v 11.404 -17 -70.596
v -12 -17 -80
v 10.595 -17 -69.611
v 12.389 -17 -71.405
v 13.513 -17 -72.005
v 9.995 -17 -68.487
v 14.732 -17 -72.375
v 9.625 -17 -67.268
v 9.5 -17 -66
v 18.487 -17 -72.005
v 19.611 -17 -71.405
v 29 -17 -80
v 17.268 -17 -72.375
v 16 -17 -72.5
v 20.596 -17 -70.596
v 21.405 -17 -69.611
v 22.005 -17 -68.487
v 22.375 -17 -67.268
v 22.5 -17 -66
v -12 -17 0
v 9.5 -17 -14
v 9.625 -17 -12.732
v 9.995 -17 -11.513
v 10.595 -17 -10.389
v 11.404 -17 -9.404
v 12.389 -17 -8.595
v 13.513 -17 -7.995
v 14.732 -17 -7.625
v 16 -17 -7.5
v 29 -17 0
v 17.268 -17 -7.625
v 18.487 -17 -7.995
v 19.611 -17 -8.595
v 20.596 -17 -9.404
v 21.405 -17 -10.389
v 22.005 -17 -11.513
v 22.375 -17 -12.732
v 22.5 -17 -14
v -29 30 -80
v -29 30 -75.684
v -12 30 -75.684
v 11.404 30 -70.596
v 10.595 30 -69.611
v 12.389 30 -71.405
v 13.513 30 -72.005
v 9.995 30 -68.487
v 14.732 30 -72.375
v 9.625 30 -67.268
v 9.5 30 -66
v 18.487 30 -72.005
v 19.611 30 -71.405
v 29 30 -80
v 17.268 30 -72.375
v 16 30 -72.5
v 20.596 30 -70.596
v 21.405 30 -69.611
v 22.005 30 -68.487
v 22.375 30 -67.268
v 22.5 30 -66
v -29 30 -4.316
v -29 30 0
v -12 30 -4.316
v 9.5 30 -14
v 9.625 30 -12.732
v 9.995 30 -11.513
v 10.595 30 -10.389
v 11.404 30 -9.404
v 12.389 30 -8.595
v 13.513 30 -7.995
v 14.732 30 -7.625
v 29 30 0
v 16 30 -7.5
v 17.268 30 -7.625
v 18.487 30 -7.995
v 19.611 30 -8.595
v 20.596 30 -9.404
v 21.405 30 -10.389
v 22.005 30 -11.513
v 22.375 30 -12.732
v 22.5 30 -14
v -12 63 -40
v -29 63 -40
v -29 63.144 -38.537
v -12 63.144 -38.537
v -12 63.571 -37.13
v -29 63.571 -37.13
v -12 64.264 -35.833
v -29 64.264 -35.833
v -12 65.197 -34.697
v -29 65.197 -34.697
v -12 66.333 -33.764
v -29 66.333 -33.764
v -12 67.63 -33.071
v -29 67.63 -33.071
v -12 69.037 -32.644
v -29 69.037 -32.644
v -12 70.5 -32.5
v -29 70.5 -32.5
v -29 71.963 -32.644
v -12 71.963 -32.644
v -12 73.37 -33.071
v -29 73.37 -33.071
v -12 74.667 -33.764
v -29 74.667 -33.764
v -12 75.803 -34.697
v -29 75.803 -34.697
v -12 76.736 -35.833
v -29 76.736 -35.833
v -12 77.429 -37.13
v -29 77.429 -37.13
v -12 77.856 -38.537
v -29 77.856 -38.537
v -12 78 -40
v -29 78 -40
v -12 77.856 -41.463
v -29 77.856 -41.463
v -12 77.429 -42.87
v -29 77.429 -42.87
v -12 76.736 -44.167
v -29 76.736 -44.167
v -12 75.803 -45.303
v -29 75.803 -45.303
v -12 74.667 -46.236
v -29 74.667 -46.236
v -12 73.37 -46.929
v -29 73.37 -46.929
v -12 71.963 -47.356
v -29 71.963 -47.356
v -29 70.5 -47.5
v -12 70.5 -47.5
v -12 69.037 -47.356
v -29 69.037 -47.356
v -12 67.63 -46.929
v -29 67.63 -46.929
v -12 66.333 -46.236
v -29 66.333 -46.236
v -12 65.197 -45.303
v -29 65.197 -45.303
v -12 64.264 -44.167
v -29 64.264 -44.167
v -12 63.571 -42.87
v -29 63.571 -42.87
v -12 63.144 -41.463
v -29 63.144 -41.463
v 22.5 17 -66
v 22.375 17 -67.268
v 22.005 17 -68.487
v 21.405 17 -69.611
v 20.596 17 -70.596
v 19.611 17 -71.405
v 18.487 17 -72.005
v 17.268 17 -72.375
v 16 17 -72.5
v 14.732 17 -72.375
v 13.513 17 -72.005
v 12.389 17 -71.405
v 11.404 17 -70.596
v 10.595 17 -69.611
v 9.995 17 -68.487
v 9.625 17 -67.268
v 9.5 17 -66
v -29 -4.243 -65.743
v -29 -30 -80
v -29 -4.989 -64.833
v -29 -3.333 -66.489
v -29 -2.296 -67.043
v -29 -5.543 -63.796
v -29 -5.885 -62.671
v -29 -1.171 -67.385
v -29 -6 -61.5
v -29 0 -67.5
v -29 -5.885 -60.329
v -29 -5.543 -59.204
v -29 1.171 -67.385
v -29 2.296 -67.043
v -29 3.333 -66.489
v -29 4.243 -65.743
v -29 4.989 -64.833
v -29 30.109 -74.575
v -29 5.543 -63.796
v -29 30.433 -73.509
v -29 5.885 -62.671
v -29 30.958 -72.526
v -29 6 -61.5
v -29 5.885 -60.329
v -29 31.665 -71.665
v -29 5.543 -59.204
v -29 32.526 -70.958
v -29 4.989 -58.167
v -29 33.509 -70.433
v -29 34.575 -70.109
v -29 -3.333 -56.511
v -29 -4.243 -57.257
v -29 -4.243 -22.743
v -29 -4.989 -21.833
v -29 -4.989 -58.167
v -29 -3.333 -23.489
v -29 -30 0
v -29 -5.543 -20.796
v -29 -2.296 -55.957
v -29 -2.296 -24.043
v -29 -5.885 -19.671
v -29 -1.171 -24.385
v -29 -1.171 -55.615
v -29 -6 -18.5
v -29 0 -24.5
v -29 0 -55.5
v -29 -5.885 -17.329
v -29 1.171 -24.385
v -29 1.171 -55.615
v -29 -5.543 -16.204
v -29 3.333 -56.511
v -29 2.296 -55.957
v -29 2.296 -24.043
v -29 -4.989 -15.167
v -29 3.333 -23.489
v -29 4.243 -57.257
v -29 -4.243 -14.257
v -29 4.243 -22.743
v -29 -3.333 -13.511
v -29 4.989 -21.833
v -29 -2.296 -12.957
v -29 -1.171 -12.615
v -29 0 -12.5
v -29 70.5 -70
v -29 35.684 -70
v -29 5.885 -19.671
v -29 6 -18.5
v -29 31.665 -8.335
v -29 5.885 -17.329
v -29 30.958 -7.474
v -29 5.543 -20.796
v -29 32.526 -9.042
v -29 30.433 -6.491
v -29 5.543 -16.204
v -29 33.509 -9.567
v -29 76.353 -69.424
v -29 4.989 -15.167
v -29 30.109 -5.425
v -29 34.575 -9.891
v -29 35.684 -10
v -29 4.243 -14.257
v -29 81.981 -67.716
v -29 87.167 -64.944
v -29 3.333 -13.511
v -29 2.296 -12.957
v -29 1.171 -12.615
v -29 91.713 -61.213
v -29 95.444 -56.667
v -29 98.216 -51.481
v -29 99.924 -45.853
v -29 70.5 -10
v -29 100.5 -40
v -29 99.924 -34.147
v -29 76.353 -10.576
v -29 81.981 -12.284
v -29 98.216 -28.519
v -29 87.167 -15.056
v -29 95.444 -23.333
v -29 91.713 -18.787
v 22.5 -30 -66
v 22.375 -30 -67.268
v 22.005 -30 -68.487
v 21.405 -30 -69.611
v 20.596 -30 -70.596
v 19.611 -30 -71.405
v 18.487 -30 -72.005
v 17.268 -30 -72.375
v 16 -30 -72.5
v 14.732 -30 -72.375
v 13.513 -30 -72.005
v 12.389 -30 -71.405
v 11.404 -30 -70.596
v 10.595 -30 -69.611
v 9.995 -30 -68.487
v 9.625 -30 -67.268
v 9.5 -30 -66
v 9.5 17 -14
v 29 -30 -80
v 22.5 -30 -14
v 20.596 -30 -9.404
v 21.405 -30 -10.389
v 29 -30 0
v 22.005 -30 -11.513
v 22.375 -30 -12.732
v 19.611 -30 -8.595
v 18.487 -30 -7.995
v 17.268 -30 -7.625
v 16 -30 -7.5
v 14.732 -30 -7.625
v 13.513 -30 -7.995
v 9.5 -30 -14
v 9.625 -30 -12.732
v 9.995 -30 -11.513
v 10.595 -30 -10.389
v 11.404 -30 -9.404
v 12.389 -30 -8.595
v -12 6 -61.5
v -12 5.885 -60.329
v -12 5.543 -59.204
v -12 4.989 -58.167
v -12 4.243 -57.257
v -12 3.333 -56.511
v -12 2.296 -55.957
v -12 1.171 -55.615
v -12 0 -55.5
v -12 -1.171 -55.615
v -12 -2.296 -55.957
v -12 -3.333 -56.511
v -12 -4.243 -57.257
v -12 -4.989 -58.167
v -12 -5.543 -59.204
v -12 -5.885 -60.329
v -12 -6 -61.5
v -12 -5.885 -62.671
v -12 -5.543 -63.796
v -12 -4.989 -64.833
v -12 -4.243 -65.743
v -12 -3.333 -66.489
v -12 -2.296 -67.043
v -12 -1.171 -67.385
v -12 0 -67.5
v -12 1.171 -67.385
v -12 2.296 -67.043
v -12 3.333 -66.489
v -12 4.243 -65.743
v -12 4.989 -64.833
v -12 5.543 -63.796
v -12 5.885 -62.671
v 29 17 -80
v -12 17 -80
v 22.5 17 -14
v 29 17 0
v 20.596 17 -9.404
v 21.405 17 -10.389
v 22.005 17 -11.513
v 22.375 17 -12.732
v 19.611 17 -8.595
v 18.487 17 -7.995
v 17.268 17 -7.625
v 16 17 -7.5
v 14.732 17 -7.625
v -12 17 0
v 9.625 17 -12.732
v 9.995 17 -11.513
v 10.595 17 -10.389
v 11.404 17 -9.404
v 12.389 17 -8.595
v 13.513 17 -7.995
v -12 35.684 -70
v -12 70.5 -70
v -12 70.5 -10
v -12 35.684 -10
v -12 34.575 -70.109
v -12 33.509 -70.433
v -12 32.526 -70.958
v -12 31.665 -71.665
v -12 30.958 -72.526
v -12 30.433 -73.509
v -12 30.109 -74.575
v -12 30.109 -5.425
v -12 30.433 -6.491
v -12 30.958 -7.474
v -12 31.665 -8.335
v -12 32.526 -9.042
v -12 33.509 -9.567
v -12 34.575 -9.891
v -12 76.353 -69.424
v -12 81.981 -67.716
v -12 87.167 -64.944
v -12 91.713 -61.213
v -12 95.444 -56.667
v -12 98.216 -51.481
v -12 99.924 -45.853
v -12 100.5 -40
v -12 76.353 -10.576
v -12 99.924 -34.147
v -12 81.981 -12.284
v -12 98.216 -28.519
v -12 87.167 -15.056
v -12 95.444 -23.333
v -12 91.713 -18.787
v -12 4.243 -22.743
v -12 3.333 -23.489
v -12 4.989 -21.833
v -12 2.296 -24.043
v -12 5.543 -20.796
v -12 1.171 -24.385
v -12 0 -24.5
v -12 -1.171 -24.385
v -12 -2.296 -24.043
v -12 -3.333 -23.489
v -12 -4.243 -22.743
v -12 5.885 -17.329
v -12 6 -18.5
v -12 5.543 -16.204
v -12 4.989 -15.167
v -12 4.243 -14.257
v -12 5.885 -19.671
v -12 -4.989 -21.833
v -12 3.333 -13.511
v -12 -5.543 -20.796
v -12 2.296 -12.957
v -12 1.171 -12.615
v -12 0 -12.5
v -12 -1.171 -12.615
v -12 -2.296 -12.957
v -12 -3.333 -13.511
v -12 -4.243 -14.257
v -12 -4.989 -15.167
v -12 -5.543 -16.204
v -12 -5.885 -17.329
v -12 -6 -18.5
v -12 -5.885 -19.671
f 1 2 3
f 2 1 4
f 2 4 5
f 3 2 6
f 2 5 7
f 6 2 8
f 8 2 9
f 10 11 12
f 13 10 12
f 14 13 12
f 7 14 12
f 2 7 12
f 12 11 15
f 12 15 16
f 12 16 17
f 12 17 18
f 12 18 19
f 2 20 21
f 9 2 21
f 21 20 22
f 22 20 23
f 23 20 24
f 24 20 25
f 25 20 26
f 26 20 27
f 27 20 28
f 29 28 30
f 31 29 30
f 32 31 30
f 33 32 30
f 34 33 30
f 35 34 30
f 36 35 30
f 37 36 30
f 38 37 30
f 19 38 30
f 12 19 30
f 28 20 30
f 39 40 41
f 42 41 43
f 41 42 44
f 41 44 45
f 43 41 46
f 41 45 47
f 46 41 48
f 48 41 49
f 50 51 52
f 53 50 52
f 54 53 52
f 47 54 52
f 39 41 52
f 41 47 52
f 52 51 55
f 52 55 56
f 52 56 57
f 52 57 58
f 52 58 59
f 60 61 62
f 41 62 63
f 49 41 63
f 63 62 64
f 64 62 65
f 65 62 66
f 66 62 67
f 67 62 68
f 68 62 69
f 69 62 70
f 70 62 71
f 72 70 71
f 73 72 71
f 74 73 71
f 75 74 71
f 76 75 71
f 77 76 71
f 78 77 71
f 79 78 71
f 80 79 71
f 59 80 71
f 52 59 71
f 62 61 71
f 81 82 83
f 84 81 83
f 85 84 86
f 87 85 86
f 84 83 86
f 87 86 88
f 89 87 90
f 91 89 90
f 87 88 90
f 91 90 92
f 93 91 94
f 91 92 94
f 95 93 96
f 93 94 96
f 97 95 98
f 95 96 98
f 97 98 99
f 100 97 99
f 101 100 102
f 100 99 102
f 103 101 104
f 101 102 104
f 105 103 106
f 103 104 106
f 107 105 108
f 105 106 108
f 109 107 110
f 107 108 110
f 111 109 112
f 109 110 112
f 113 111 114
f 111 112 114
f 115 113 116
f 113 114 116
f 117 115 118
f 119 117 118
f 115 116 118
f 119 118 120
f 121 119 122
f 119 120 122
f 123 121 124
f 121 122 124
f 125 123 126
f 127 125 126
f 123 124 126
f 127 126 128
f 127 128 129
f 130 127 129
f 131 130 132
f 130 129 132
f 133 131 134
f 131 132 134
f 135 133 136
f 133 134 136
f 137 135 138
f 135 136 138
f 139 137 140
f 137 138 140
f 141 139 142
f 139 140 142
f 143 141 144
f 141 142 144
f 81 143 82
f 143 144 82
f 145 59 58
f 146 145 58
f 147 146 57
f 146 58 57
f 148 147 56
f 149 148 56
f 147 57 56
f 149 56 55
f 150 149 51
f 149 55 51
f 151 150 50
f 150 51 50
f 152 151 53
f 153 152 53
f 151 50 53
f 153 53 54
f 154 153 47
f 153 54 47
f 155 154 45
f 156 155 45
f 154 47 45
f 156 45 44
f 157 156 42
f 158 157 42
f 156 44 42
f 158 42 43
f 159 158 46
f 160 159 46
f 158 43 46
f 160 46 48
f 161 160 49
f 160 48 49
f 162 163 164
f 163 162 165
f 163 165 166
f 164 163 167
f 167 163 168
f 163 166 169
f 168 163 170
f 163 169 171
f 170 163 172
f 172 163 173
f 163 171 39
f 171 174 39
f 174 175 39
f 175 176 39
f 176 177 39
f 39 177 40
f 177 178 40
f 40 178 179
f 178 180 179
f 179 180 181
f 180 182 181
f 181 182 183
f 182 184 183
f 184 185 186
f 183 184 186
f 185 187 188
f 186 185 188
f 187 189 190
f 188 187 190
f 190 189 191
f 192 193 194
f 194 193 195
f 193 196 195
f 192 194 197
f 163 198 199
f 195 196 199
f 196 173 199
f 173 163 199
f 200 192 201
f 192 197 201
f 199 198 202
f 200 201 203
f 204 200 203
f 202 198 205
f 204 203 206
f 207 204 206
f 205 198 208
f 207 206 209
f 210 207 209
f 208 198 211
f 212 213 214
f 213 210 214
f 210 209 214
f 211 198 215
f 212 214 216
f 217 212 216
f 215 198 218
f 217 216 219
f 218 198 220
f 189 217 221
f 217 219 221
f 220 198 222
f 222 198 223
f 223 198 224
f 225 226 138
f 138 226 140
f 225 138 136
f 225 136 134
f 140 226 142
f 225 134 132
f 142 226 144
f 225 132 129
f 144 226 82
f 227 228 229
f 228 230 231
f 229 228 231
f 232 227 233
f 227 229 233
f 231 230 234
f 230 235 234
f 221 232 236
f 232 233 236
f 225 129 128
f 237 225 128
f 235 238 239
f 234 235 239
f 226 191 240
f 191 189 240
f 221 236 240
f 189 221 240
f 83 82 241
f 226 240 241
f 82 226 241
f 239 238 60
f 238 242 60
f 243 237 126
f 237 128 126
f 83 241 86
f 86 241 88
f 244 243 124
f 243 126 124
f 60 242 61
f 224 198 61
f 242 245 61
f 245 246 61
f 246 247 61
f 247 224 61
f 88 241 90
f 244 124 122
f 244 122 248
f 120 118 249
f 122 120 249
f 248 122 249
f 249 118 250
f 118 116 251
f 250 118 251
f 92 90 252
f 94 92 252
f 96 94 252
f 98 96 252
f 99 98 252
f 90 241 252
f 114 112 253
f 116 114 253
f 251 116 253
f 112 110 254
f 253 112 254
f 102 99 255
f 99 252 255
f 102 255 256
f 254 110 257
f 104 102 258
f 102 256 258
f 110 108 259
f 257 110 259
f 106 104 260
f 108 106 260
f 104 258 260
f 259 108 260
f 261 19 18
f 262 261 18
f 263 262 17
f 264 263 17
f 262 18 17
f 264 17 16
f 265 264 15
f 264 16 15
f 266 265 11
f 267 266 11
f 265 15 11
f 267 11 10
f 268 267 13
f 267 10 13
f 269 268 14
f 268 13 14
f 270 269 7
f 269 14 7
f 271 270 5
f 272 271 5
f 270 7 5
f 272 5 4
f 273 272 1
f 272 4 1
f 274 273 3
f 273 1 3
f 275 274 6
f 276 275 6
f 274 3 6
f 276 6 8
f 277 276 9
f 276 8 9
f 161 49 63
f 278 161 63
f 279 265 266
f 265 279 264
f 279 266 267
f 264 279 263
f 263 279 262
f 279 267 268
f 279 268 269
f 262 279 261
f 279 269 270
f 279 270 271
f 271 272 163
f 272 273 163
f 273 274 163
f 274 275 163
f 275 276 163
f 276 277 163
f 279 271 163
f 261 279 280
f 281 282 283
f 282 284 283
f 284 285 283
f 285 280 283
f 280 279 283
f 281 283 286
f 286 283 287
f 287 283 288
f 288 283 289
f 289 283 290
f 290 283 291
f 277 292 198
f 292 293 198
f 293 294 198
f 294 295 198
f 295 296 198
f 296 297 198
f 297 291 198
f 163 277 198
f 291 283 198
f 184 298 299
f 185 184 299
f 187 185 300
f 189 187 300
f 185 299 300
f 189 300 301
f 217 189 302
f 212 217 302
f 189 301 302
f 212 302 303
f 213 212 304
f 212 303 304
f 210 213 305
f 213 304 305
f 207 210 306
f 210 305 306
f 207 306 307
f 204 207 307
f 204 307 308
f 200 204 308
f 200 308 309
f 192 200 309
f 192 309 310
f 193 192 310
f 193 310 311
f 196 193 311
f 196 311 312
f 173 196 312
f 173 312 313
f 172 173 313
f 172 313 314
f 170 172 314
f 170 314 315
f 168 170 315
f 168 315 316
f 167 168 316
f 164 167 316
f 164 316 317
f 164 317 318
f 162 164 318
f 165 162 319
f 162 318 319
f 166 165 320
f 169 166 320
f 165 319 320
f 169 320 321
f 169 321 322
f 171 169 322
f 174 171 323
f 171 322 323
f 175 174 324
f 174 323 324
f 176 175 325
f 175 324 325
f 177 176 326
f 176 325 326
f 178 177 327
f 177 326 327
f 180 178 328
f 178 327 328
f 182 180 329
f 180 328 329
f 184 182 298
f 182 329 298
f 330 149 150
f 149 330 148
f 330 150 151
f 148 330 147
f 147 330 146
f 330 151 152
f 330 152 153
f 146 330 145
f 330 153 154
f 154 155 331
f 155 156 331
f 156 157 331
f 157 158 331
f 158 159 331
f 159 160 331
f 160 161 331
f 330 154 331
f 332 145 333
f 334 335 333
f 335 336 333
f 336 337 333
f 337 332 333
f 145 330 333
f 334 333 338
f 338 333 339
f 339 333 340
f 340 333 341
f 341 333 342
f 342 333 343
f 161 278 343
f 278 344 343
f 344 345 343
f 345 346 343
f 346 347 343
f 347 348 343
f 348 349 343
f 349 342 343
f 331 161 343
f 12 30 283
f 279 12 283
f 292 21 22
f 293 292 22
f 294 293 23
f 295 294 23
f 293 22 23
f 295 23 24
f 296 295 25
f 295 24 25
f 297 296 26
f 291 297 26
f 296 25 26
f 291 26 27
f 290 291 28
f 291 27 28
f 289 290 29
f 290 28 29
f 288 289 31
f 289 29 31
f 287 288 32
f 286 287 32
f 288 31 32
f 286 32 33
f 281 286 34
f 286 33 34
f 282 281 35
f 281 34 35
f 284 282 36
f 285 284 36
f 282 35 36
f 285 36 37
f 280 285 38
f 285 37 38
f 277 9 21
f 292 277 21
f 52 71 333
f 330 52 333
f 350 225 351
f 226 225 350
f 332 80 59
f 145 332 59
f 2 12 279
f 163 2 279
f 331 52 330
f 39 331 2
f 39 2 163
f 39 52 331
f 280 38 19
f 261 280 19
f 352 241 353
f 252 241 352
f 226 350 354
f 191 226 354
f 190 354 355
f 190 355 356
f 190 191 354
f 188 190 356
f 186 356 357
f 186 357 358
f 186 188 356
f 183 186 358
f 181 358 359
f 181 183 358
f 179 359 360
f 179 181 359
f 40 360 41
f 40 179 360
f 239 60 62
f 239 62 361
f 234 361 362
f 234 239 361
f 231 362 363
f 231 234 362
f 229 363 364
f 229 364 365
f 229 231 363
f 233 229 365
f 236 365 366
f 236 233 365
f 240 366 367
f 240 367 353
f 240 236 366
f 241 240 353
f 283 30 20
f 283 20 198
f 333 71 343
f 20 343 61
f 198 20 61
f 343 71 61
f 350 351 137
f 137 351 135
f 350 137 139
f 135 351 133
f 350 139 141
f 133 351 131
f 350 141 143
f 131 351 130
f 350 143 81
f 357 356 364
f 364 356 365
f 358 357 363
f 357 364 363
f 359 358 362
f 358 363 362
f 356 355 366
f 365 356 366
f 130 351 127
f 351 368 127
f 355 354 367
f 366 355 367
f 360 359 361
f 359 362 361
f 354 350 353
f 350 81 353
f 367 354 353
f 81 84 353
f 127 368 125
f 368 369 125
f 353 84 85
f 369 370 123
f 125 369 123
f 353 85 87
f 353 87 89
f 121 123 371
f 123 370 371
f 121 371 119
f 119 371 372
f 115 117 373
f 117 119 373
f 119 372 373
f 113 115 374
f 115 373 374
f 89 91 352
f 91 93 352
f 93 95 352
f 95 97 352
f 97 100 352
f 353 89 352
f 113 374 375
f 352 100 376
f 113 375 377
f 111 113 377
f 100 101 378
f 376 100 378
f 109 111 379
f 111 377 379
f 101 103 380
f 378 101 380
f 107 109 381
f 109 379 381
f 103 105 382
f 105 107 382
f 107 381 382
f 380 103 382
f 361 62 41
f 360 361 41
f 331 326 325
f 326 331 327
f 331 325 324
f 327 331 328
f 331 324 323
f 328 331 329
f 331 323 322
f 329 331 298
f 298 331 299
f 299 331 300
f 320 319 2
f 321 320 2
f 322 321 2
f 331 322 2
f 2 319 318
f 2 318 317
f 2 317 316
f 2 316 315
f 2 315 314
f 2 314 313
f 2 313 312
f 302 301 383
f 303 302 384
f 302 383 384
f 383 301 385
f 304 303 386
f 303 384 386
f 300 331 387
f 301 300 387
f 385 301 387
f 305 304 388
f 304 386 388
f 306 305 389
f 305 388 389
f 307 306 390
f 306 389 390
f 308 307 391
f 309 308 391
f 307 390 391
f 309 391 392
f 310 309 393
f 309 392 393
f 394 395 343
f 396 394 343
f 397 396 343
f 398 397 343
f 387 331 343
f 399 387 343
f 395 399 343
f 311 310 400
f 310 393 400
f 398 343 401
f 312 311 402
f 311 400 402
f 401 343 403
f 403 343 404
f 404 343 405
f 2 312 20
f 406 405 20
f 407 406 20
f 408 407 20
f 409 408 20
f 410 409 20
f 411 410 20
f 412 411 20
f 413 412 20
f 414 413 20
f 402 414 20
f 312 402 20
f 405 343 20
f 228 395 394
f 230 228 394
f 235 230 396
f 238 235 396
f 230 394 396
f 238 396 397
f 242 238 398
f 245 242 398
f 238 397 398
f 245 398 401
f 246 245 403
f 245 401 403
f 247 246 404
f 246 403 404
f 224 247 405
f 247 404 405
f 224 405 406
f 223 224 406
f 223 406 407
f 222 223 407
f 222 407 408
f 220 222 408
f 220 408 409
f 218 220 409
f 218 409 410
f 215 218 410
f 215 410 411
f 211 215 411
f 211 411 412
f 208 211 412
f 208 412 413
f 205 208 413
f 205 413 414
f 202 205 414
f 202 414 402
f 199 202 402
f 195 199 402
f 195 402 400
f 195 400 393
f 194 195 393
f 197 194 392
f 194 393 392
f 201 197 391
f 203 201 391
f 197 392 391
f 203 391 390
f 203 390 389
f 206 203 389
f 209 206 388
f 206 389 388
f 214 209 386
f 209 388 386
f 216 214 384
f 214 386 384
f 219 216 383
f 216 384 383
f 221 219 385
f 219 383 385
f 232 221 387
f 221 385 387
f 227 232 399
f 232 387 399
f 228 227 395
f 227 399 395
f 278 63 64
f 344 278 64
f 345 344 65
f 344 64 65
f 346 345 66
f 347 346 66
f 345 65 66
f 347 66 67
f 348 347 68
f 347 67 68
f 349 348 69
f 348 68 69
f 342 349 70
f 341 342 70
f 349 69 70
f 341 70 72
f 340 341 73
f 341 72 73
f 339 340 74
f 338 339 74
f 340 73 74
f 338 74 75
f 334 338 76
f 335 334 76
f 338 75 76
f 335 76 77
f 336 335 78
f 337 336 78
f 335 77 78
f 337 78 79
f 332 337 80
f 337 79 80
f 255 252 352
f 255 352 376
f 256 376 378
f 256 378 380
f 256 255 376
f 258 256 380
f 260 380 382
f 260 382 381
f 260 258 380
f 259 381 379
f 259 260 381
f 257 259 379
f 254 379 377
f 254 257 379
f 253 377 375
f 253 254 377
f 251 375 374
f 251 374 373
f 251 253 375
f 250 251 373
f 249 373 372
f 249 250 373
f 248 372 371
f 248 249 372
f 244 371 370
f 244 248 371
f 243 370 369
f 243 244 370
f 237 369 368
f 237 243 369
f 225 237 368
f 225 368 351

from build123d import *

# Parameters (mm, degrees)
BOSS_EXTRUDE1_DEPTH = 80
BOSS_EXTRUDE2_DEPTH = 17
SKETCH3_R           = 7.5
CUT_EXTRUDE1_DEPTH  = 17
CUT_EXTRUDE2_DEPTH  = 70
SKETCH6_R           = 6
CUT_EXTRUDE3_DEPTH  = 20


with BuildPart() as part:
    # Sketch1 → Boss-Extrude1 (new body)
    with BuildSketch(Plane.XY):
        Polygon((-12, 17), (-12, -17), (29, -17), (29, -30), (-29, -30), (-29, 30), (29, 30), (29, 17), align=None)
    extrude(amount=-BOSS_EXTRUDE1_DEPTH)

    # Sketch2 → Boss-Extrude2 (add)
    with BuildSketch(Plane.ZY.offset(29)):
        with BuildLine():
            Line((-70, 70.5), (-70, 35.68393157))
            ThreePointArc((-70, 35.68393157), (-71.664785013, 31.664785013), (-75.68393157, 30))
            Line((-75.68393157, 30), (-4.31606843, 30))
            ThreePointArc((-4.31606843, 30), (-8.335214987, 31.664785013), (-10, 35.68393157))
            Line((-10, 35.68393157), (-10, 70.5))
            ThreePointArc((-10, 70.5), (-40, 100.5), (-70, 70.5))
        make_face()
    extrude(amount=-BOSS_EXTRUDE2_DEPTH)

    # Sketch3 → Cut-Extrude1 (cut)
    with BuildSketch(Plane.ZY.offset(29)):
        with Locations(Location((-40, 70.5, 0), (0, 0, 270))):
            Circle(SKETCH3_R)
    extrude(amount=-CUT_EXTRUDE1_DEPTH, mode=Mode.SUBTRACT)

    # Sketch4 → Cut-Extrude2 (cut)
    with BuildSketch(Plane(origin=(0, 30, 0), x_dir=(1, 0, 0), z_dir=(0, 1, 0))):
        with BuildLine():
            Line((9.5, 66), (9.5, 14))
            ThreePointArc((9.5, 14), (16, 7.5), (22.5, 14))
            Line((22.5, 14), (22.5, 66))
            ThreePointArc((22.5, 66), (16, 72.5), (9.5, 66))
        make_face()
    extrude(amount=-CUT_EXTRUDE2_DEPTH, mode=Mode.SUBTRACT)

    # Sketch6 → Cut-Extrude3 (cut)
    with BuildSketch(Plane(origin=(-12, 0, 0), x_dir=(0, 0, -1), z_dir=(1, 0, 0))):
        with Locations(Location((18.5, 0, 0), (0, 0, 90))):
            Circle(SKETCH6_R)
        with Locations(Location((61.5, 0, 0), (0, 0, 90))):
            Circle(SKETCH6_R)
    extrude(amount=-CUT_EXTRUDE3_DEPTH, mode=Mode.SUBTRACT)


solid = part.part
